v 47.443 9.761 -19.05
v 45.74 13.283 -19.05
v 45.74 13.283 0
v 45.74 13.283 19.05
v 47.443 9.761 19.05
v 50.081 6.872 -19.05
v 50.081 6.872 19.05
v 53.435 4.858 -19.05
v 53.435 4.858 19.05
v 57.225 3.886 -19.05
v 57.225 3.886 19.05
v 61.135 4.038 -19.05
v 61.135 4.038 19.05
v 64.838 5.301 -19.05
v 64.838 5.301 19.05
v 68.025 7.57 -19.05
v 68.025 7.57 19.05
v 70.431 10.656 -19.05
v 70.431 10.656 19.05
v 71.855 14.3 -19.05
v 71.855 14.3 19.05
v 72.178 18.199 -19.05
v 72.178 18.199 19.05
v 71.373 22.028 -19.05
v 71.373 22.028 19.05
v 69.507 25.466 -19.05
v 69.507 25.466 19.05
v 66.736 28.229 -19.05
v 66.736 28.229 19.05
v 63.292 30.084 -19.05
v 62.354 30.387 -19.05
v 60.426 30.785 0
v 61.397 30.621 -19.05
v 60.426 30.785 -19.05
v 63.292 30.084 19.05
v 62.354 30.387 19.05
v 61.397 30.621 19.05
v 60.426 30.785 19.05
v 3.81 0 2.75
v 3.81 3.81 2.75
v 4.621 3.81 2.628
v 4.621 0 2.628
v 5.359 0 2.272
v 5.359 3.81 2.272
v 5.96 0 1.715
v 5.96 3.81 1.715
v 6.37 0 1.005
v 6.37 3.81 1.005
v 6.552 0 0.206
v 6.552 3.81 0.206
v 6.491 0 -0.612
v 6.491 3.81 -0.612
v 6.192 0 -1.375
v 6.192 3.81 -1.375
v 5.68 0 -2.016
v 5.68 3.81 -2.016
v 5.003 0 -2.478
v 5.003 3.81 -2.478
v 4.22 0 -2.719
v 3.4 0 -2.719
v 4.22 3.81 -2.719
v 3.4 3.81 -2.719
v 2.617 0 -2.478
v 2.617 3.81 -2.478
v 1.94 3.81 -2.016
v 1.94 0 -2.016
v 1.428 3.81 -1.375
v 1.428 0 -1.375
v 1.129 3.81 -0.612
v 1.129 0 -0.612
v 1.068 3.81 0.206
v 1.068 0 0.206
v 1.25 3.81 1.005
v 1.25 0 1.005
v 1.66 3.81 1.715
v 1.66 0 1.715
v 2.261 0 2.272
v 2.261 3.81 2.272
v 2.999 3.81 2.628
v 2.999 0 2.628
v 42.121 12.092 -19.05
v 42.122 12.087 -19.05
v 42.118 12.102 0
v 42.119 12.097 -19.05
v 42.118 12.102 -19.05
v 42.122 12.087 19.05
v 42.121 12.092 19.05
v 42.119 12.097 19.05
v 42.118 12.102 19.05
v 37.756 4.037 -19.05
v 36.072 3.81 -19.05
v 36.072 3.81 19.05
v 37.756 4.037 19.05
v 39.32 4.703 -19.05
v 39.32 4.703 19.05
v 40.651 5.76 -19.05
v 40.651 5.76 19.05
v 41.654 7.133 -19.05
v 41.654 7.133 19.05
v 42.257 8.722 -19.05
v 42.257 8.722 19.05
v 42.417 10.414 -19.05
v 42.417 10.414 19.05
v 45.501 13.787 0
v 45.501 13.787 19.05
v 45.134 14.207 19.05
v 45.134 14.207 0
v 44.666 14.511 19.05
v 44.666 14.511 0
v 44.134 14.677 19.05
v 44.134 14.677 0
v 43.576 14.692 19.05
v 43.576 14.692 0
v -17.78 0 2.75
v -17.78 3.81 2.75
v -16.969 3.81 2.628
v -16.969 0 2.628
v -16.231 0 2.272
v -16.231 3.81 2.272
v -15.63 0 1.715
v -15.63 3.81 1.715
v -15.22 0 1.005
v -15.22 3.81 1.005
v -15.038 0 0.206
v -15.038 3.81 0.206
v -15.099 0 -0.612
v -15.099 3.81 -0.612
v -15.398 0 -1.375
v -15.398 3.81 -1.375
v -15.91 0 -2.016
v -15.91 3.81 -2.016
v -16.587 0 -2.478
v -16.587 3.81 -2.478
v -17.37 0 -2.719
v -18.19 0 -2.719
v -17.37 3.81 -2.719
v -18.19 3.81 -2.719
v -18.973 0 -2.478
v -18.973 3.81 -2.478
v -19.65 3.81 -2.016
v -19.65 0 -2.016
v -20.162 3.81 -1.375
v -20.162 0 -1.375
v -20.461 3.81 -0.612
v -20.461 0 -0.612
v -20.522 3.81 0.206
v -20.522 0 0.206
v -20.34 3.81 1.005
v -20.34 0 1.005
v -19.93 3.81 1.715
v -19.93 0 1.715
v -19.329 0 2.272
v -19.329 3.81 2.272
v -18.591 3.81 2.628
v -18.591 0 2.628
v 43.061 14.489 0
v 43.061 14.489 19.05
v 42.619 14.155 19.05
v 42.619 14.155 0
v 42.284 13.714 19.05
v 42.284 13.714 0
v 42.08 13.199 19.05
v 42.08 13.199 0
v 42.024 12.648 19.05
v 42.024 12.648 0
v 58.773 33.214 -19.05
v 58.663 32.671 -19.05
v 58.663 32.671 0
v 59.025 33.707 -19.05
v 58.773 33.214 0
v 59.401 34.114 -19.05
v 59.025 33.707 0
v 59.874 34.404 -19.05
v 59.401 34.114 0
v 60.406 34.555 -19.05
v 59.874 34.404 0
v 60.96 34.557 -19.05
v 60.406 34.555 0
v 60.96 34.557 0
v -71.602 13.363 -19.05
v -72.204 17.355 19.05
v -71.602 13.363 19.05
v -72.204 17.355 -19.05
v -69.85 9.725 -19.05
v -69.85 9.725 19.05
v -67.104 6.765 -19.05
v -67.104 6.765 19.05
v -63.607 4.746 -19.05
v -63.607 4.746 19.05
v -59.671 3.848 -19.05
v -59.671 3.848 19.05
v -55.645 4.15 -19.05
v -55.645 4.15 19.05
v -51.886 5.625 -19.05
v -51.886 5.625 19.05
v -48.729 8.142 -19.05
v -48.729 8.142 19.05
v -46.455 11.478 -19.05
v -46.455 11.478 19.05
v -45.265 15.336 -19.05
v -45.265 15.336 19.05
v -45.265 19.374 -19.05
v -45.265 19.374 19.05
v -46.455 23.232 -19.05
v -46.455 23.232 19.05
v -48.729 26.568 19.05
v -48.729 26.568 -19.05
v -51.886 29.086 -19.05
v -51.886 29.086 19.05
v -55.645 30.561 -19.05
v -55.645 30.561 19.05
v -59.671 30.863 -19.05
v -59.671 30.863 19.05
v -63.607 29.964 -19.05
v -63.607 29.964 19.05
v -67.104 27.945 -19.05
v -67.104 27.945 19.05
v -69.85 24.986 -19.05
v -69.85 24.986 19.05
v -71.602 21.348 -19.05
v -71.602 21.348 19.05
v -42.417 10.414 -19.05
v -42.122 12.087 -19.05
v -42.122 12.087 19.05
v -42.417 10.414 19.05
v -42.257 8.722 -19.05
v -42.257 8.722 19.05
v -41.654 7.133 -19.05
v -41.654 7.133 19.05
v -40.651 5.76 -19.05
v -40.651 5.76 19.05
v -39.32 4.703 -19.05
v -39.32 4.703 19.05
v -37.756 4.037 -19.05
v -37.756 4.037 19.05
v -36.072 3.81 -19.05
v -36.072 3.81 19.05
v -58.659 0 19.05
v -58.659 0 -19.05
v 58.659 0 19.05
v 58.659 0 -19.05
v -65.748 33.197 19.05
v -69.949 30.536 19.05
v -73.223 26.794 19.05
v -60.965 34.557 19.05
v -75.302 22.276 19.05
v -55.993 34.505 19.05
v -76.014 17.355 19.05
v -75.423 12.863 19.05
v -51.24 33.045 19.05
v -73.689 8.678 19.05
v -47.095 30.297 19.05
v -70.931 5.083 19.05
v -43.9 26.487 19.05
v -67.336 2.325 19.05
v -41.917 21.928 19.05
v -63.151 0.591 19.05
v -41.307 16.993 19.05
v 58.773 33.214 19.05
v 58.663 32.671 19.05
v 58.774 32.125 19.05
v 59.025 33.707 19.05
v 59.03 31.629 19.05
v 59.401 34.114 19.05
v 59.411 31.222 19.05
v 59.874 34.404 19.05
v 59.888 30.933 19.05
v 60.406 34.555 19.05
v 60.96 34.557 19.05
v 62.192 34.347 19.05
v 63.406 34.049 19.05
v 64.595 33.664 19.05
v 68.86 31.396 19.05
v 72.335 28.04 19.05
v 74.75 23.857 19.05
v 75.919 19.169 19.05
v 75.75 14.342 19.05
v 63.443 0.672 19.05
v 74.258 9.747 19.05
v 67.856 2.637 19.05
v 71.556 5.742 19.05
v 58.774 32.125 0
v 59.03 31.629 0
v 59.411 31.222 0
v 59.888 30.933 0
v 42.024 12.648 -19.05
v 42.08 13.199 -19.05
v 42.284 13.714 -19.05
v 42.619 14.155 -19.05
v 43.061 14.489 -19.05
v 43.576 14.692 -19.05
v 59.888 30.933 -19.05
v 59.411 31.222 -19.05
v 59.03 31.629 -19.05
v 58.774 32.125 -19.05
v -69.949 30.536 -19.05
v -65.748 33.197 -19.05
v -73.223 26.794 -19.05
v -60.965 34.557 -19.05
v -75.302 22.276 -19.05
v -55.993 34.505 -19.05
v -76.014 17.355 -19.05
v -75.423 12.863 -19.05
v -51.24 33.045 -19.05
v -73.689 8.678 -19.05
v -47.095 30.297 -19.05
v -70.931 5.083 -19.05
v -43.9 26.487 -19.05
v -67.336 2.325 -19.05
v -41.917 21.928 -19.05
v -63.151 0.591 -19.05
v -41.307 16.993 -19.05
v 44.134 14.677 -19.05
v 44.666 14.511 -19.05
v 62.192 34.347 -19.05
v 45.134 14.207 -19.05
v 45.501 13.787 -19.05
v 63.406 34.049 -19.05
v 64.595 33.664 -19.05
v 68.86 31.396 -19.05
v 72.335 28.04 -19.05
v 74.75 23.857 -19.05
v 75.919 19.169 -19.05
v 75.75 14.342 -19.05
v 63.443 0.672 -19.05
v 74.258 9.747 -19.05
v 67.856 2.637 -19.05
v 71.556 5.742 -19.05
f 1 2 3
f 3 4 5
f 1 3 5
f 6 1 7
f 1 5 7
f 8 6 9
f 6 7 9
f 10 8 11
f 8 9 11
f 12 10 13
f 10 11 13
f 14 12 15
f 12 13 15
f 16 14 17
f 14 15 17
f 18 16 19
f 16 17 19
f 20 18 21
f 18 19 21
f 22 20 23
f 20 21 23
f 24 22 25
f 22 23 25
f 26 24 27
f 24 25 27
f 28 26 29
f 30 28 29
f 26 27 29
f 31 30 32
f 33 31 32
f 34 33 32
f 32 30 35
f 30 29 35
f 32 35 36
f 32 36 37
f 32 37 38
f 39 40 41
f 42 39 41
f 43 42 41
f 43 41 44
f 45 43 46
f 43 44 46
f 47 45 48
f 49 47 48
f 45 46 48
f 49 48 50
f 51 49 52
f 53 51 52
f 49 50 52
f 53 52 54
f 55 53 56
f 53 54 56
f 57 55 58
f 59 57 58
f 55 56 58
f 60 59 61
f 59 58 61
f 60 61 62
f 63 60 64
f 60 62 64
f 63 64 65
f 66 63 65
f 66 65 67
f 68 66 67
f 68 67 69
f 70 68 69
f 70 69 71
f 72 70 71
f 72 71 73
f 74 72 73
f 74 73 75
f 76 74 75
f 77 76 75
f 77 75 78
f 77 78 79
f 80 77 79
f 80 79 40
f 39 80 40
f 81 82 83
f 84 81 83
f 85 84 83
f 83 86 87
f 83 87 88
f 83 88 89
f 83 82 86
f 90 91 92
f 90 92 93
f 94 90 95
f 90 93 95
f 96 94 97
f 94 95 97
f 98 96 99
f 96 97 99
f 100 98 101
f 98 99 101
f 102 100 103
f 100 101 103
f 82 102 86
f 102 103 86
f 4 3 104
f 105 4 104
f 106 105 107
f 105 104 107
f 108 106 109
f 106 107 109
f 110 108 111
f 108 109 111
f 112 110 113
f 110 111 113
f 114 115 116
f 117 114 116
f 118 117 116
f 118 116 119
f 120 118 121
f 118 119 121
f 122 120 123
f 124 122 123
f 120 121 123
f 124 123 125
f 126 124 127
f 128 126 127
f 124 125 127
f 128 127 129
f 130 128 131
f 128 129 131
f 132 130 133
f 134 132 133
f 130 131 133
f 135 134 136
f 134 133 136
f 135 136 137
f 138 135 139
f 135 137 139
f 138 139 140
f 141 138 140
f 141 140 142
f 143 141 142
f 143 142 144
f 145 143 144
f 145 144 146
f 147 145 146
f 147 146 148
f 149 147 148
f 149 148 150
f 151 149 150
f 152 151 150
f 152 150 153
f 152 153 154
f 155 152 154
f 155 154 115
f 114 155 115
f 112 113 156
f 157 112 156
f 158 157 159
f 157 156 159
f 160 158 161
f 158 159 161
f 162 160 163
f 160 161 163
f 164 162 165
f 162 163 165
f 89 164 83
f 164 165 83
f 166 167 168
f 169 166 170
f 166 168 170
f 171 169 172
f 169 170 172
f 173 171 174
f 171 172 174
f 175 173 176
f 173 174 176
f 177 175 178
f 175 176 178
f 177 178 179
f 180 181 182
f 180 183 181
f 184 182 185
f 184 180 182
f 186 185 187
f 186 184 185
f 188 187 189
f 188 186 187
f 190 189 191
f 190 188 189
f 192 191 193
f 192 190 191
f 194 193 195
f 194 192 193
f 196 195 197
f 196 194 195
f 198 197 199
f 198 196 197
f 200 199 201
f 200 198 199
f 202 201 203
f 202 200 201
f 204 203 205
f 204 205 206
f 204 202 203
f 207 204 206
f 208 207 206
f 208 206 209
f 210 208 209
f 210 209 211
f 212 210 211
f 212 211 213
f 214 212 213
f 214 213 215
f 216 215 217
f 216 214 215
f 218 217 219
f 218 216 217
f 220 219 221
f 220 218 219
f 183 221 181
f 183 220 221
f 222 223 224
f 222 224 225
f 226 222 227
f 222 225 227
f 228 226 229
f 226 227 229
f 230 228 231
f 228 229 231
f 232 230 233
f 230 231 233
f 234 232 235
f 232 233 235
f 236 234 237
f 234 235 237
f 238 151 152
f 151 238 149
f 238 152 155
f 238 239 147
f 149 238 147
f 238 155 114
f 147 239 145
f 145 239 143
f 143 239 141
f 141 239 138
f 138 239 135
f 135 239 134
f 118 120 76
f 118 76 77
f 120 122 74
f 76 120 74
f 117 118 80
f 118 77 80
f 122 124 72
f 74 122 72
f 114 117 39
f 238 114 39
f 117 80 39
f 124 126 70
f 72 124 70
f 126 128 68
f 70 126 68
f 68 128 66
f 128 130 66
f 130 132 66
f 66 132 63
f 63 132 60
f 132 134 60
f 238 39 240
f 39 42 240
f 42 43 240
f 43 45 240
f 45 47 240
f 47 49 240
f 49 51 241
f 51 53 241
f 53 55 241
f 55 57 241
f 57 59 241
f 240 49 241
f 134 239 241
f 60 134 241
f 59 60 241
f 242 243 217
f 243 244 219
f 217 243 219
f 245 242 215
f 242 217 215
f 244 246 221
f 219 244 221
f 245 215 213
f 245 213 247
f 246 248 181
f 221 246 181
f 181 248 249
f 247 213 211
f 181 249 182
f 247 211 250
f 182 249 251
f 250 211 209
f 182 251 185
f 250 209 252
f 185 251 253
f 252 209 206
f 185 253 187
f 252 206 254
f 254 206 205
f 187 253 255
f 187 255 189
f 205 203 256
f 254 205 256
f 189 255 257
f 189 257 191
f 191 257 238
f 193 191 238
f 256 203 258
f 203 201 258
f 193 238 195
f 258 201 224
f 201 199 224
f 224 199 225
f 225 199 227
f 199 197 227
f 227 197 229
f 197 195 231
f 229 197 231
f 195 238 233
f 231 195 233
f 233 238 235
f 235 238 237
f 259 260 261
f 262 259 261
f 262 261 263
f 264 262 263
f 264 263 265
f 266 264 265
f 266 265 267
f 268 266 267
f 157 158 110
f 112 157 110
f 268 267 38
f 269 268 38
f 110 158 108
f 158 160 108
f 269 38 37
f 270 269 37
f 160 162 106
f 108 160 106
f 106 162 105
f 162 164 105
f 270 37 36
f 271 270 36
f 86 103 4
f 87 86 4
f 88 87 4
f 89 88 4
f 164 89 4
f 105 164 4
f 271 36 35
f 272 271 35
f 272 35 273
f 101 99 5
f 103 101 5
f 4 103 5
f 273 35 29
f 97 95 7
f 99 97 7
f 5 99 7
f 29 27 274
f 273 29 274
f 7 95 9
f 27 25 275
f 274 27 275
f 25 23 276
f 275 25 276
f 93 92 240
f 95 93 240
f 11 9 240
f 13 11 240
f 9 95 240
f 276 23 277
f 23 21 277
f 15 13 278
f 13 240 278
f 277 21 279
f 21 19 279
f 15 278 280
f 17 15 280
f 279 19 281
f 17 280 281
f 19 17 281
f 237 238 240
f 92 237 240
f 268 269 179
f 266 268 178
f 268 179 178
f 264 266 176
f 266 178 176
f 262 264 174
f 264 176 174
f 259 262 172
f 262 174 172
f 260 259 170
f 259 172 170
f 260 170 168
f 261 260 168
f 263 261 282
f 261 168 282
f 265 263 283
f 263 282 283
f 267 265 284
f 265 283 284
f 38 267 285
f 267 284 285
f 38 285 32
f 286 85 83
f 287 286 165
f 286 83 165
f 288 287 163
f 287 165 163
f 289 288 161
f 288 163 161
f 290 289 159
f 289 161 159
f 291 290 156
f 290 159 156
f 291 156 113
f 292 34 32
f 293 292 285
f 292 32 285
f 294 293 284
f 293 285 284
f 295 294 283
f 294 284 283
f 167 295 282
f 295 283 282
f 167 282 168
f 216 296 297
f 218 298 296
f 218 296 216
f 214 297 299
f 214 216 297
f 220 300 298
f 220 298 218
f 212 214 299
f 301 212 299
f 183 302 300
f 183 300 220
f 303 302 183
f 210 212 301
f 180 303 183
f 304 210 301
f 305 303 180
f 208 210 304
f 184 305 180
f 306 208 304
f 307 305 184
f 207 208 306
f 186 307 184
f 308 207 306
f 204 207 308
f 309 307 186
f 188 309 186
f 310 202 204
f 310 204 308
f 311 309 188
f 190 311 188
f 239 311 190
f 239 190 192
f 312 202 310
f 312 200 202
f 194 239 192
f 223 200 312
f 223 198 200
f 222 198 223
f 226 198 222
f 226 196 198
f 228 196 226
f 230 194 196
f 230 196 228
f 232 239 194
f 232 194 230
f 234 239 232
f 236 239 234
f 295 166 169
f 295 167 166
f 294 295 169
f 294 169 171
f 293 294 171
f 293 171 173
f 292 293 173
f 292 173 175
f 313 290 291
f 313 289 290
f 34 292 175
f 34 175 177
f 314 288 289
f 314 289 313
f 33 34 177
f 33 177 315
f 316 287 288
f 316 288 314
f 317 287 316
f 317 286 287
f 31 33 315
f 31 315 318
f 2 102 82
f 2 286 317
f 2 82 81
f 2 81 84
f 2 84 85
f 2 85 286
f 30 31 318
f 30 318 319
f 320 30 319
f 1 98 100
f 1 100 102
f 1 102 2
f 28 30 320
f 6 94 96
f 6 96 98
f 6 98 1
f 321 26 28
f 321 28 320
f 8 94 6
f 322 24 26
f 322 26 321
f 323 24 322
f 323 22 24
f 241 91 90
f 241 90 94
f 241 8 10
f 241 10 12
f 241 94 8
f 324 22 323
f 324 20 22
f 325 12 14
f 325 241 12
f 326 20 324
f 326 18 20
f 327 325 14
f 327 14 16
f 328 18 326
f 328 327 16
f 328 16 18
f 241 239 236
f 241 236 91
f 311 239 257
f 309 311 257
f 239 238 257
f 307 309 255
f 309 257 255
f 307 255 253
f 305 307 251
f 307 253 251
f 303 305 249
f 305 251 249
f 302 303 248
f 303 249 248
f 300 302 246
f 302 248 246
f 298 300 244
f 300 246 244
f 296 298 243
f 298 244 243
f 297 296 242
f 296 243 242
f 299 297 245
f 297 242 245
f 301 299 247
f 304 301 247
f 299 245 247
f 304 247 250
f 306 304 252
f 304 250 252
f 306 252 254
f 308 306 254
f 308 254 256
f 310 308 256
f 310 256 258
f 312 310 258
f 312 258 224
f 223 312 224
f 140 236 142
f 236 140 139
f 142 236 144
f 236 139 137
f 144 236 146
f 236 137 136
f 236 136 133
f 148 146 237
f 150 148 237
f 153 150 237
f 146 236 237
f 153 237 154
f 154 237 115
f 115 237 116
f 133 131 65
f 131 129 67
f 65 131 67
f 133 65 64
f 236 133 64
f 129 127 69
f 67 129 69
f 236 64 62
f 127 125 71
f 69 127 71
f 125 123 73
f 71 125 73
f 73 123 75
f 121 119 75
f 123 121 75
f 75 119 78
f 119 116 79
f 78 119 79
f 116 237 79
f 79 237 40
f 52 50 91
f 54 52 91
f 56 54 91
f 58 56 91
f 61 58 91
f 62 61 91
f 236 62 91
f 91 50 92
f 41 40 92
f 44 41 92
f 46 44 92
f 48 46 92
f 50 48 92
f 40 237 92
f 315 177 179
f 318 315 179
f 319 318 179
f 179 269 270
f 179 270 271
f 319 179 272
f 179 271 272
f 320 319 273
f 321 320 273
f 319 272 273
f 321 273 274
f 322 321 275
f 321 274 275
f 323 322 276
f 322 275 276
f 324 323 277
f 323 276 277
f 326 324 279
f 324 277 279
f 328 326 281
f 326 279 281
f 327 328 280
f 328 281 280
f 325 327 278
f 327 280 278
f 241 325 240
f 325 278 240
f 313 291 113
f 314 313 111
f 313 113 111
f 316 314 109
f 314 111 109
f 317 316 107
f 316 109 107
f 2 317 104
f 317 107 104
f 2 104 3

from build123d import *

# Parameters (mm, degrees)
SKETCH3_W           = 114.3
SKETCH3_H           = 38.1
BOSS_EXTRUDE1_DEPTH = 3.81
SKETCH4_R           = 13.5453125
BOSS_EXTRUDE2_DEPTH = 19.05
FILLET1_R           = 2.032
SKETCH5_R           = 2.749999961
CUT_EXTRUDE4_DEPTH  = 12.7


with BuildPart() as part:
    # Sketch3 → Boss-Extrude1 (new body)
    with BuildSketch(Plane(origin=(0, 0, 0), x_dir=(1, 0, 0), z_dir=(0, 1, 0))):
        Rectangle(SKETCH3_W, SKETCH3_H)
    extrude(amount=BOSS_EXTRUDE1_DEPTH)

    # Sketch4 → Boss-Extrude2 (add, symmetric)
    with BuildSketch(Plane.XY):
        with BuildLine():
            Line((-36.071859255, 3.81), (36.071859255, 3.81))
            ThreePointArc((36.071859255, 3.81), (41.198342199, 6.412778013), (42.122274879, 12.087425946))
            ThreePointArc((42.122274879, 12.087425946), (41.806974837, 13.2052175), (41.567140999, 14.341594112))
            Line((41.567140999, 14.341594112), (45.319258538, 15.003193668))
            ThreePointArc((45.319258538, 15.003193668), (67.365546349, 6.979001129), (63.291557028, 30.083742702))
            ThreePointArc((63.291557028, 30.083742702), (61.010906137, 30.694841267), (58.658787305, 30.900625))
            Line((58.658787305, 30.900625), (58.658787305, 34.710625))
            ThreePointArc((58.658787305, 34.710625), (61.672505693, 34.446958806), (64.594653774, 33.663971588))
            ThreePointArc((64.594653774, 33.663971588), (75.750433611, 14.341594112), (58.658787305, 0))
            Line((58.658787305, 0), (-58.658787305, 0))
            ThreePointArc((-58.658787305, 0), (-70.930846463, 5.083253342), (-76.014099805, 17.3553125))
            ThreePointArc((-76.014099805, 17.3553125), (-55.993216901, 34.504703346), (-42.122274879, 12.087425946))
            ThreePointArc((-42.122274879, 12.087425946), (-41.198342199, 6.412778013), (-36.071859255, 3.81))
        make_face()
        with Locations(Location((-58.658787305, 17.3553125, 0), (0, 0, 180))):
            Circle(SKETCH4_R, mode=Mode.SUBTRACT)
    extrude(amount=BOSS_EXTRUDE2_DEPTH, both=True)

    # Fillet1
    # the kernel refuses this fillet: 2.032 mm, written as the material it takes off along each edge
    with BuildSketch(Plane(origin=(58.658787305, 34.710625, 0), x_dir=(0, -1, 0), z_dir=(0, 0, -1)), Plane(origin=(41.567140999, 14.341594112, 0), x_dir=(0.9848077530122078, 0.17364817766693208, 0), z_dir=(0, 0, 1))) as fillet1_piece_1:
        with BuildLine():
            CenterArc((2.16732771, -2.032), FILLET1_R, 90, 97.620348072)
            ThreePointArc((0.153273302, -2.301460275), (0.03836072, -1.153279249), (0, 0))
            Line((0, 0), (2.16732771, 0))
        make_face()
    extrude(amount=24.816396244, mode=Mode.SUBTRACT)
    with BuildSketch(Plane(origin=(58.658787305, 30.900625, 0), x_dir=(0.9978615634411592, -0.06536283505758803, 0), z_dir=(0, 0, -1)), Plane(origin=(45.319258538, 15.003193668, 0), x_dir=(0.23764666877900192, -0.9713516669148425, 0), z_dir=(0, 0, 1))) as fillet1_piece_2:
        with BuildLine():
            CenterArc((1.903537334, -2.027654697), FILLET1_R, 93.747686363, 82.504627273)
            Line((-0.124117363, -1.894837416), (0, 0))
            ThreePointArc((0, 0), (0.885360027, -0.028965791), (1.770720053, 0))
        make_face()
    extrude(amount=23.797245223, mode=Mode.SUBTRACT)
    with BuildSketch(Plane(origin=(45.319258538, 15.003193668, 0), x_dir=(-0.9848077530122076, -0.17364817766693288, 0), z_dir=(0, 0, -1)), Plane(origin=(58.658787305, 30.900625, 0), x_dir=(0, 1, 0), z_dir=(0, 0, 1))) as fillet1_piece_3:
        with BuildLine():
            CenterArc((1.898898089, -2.032), FILLET1_R, 90, 82.504627273)
            ThreePointArc((-0.115739283, -1.766933481), (-0.028965791, -0.885360027), (0, 0))
            Line((0, 0), (1.898898089, 0))
        make_face()
    extrude(amount=23.797245223, mode=Mode.SUBTRACT)
    with BuildSketch(Plane(origin=(41.567140999, 14.341594112, 0), x_dir=(0.23870589854739682, -0.9710919081110089, 0), z_dir=(0, 0, -1)), Plane(origin=(58.658787305, 34.710625, 0), x_dir=(0.9977896842762429, -0.06645107938864023, 0), z_dir=(0, 0, 1))) as fillet1_piece_4:
        with BuildLine():
            CenterArc((2.171529904, -2.027508638), FILLET1_R, 86.189825964, 97.620348072)
            Line((0.144021266, -2.162537232), (0, 0))
            ThreePointArc((0, 0), (1.153279249, 0.03836072), (2.306558498, 0))
        make_face()
    extrude(amount=24.816396244, mode=Mode.SUBTRACT)

    # Sketch5 → Cut-Extrude4 (cut)
    with BuildSketch(Plane(origin=(0, 3.81, 0), x_dir=(1, 0, 0), z_dir=(0, 1, 0))):
        with Locations(Location((-17.78, 0, 0), (0, 0, 270))):
            Circle(SKETCH5_R)
        with Locations(Location((3.81, 0, 0), (0, 0, 270))):
            Circle(SKETCH5_R)
    extrude(amount=-CUT_EXTRUDE4_DEPTH, mode=Mode.SUBTRACT)


solid = part.part
